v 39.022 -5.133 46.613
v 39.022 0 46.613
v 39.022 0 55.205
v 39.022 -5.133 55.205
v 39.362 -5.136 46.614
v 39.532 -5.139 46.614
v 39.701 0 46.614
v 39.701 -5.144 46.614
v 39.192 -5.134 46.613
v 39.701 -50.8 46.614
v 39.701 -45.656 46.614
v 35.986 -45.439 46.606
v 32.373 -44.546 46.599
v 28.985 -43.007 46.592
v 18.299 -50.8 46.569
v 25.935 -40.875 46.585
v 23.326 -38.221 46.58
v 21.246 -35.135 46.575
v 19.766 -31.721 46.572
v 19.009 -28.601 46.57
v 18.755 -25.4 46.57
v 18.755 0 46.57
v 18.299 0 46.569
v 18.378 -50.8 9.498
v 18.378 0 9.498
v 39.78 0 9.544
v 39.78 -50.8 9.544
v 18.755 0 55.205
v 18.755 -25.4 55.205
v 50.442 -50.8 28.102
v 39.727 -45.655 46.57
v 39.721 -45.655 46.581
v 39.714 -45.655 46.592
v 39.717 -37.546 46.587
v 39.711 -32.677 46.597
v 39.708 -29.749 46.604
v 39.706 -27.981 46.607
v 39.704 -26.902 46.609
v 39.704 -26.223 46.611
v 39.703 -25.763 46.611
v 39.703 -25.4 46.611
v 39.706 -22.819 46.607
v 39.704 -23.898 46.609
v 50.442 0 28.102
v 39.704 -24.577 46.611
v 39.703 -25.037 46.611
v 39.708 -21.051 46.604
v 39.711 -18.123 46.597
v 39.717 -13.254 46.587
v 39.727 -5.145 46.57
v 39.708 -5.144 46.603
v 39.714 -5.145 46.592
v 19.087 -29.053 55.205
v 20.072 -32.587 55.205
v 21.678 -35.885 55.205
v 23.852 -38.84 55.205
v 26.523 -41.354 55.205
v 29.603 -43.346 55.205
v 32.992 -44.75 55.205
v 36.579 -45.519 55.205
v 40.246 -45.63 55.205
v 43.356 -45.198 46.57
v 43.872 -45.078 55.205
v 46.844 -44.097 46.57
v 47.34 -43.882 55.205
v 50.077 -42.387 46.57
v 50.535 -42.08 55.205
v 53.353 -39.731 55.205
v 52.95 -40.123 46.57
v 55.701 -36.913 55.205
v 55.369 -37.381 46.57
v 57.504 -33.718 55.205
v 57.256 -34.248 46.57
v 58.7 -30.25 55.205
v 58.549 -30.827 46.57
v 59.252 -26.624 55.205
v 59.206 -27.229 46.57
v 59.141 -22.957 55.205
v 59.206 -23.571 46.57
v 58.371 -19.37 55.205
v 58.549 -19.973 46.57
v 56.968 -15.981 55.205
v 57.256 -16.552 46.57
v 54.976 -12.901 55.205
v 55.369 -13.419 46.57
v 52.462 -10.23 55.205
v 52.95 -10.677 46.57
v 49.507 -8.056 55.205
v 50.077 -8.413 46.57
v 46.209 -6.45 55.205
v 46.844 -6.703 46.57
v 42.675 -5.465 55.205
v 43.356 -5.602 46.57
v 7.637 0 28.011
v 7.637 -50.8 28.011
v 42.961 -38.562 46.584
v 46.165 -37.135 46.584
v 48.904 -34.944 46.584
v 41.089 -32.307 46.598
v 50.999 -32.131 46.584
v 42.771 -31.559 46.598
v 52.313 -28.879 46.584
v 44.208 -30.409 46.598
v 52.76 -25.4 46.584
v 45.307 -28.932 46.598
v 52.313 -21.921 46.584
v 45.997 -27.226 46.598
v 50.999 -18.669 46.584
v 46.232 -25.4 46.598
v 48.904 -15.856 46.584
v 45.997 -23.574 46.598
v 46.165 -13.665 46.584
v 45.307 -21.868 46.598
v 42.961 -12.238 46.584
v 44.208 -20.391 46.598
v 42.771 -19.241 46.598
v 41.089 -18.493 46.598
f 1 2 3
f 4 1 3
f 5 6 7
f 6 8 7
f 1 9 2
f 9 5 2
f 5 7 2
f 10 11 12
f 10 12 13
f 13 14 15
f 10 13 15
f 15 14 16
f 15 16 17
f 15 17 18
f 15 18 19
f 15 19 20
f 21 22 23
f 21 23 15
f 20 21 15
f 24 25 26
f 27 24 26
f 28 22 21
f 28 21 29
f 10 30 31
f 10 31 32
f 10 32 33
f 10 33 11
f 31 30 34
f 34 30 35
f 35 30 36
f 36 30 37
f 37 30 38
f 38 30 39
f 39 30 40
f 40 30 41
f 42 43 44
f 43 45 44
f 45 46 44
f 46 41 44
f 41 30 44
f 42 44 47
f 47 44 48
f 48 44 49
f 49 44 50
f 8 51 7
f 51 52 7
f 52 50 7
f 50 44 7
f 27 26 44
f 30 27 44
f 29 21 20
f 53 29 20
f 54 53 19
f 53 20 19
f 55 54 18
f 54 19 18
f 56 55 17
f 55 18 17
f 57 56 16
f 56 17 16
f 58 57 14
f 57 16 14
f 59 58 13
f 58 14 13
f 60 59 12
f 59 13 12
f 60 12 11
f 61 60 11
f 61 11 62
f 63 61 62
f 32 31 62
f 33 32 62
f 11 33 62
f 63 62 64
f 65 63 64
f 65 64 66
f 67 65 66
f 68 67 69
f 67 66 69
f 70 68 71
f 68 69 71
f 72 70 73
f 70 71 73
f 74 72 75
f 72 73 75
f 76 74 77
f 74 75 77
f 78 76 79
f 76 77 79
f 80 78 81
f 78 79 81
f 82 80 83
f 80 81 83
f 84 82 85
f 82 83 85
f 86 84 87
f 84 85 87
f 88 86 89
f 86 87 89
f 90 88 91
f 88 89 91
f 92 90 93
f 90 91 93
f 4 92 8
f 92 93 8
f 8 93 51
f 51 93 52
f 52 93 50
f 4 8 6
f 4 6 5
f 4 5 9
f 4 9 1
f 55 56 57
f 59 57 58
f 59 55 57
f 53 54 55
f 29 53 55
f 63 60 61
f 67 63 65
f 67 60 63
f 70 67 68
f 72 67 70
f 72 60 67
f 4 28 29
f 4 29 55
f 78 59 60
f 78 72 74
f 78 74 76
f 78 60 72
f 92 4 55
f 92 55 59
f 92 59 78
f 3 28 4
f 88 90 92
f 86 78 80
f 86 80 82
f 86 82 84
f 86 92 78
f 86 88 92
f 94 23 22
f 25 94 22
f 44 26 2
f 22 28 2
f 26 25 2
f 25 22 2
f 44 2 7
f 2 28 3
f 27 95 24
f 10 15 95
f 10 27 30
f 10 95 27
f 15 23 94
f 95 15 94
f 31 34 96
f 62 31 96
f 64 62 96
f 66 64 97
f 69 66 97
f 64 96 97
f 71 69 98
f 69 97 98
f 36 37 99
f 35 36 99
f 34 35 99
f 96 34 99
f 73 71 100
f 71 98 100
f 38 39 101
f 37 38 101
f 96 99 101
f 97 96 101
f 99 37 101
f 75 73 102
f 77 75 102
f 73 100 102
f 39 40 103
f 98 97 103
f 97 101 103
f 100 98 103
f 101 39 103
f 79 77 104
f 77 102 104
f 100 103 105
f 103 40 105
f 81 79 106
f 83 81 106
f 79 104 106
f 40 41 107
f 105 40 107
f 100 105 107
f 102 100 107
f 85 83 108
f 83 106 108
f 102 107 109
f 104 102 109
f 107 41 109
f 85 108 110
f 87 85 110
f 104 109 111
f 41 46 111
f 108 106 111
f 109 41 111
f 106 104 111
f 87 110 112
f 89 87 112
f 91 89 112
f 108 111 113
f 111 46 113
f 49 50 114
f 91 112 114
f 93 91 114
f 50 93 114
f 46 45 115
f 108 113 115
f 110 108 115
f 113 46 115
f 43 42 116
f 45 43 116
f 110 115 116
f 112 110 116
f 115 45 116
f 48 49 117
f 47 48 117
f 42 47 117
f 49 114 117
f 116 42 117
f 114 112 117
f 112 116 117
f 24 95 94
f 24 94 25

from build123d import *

# Parameters (mm, degrees)
F1_DEPTH = 50.8
F2_W     = 20.2671810985
F2_H     = 8.7723657489
F3_DEPTH = 25.4


with BuildPart() as f1:
    # F0 (on Front) → F1 (new body)
    with BuildSketch(Plane.XZ):
        Polygon((50.4421505383, 28.1019427396), (39.7014406272, 46.614386835), (18.2988387989, 46.5688812451), (7.6369468817, 28.0109315597), (18.3776567927, 9.4984874643), (39.780258621, 9.5439930542), align=None)
    extrude(amount=F1_DEPTH)

    # F2 (on Front) → F3 (join)
    with BuildSketch(Plane.XZ):
        with Locations((28.8883000612, 50.8192069829)):
            Rectangle(F2_W, F2_H)
    extrude(amount=F3_DEPTH)

    # F3_face (on face) → F4 (revolve)
    with BuildSketch(Plane(origin=(28.8798511824, -25.4, 50.8983840717), x_dir=(1, 0, 0), z_dir=(0, -1, 0))):
        Polygon((10.1420394281, 4.3070057856), (-10.1251416704, 4.3070057856), (-10.1251416704, -4.3285335675), (10.1420394281, -4.2854420762), align=None)
    revolve(axis=Axis((39.0218906105, -25.4, 50.9091659264), (0, 0, 1)))


solid = f1.part
